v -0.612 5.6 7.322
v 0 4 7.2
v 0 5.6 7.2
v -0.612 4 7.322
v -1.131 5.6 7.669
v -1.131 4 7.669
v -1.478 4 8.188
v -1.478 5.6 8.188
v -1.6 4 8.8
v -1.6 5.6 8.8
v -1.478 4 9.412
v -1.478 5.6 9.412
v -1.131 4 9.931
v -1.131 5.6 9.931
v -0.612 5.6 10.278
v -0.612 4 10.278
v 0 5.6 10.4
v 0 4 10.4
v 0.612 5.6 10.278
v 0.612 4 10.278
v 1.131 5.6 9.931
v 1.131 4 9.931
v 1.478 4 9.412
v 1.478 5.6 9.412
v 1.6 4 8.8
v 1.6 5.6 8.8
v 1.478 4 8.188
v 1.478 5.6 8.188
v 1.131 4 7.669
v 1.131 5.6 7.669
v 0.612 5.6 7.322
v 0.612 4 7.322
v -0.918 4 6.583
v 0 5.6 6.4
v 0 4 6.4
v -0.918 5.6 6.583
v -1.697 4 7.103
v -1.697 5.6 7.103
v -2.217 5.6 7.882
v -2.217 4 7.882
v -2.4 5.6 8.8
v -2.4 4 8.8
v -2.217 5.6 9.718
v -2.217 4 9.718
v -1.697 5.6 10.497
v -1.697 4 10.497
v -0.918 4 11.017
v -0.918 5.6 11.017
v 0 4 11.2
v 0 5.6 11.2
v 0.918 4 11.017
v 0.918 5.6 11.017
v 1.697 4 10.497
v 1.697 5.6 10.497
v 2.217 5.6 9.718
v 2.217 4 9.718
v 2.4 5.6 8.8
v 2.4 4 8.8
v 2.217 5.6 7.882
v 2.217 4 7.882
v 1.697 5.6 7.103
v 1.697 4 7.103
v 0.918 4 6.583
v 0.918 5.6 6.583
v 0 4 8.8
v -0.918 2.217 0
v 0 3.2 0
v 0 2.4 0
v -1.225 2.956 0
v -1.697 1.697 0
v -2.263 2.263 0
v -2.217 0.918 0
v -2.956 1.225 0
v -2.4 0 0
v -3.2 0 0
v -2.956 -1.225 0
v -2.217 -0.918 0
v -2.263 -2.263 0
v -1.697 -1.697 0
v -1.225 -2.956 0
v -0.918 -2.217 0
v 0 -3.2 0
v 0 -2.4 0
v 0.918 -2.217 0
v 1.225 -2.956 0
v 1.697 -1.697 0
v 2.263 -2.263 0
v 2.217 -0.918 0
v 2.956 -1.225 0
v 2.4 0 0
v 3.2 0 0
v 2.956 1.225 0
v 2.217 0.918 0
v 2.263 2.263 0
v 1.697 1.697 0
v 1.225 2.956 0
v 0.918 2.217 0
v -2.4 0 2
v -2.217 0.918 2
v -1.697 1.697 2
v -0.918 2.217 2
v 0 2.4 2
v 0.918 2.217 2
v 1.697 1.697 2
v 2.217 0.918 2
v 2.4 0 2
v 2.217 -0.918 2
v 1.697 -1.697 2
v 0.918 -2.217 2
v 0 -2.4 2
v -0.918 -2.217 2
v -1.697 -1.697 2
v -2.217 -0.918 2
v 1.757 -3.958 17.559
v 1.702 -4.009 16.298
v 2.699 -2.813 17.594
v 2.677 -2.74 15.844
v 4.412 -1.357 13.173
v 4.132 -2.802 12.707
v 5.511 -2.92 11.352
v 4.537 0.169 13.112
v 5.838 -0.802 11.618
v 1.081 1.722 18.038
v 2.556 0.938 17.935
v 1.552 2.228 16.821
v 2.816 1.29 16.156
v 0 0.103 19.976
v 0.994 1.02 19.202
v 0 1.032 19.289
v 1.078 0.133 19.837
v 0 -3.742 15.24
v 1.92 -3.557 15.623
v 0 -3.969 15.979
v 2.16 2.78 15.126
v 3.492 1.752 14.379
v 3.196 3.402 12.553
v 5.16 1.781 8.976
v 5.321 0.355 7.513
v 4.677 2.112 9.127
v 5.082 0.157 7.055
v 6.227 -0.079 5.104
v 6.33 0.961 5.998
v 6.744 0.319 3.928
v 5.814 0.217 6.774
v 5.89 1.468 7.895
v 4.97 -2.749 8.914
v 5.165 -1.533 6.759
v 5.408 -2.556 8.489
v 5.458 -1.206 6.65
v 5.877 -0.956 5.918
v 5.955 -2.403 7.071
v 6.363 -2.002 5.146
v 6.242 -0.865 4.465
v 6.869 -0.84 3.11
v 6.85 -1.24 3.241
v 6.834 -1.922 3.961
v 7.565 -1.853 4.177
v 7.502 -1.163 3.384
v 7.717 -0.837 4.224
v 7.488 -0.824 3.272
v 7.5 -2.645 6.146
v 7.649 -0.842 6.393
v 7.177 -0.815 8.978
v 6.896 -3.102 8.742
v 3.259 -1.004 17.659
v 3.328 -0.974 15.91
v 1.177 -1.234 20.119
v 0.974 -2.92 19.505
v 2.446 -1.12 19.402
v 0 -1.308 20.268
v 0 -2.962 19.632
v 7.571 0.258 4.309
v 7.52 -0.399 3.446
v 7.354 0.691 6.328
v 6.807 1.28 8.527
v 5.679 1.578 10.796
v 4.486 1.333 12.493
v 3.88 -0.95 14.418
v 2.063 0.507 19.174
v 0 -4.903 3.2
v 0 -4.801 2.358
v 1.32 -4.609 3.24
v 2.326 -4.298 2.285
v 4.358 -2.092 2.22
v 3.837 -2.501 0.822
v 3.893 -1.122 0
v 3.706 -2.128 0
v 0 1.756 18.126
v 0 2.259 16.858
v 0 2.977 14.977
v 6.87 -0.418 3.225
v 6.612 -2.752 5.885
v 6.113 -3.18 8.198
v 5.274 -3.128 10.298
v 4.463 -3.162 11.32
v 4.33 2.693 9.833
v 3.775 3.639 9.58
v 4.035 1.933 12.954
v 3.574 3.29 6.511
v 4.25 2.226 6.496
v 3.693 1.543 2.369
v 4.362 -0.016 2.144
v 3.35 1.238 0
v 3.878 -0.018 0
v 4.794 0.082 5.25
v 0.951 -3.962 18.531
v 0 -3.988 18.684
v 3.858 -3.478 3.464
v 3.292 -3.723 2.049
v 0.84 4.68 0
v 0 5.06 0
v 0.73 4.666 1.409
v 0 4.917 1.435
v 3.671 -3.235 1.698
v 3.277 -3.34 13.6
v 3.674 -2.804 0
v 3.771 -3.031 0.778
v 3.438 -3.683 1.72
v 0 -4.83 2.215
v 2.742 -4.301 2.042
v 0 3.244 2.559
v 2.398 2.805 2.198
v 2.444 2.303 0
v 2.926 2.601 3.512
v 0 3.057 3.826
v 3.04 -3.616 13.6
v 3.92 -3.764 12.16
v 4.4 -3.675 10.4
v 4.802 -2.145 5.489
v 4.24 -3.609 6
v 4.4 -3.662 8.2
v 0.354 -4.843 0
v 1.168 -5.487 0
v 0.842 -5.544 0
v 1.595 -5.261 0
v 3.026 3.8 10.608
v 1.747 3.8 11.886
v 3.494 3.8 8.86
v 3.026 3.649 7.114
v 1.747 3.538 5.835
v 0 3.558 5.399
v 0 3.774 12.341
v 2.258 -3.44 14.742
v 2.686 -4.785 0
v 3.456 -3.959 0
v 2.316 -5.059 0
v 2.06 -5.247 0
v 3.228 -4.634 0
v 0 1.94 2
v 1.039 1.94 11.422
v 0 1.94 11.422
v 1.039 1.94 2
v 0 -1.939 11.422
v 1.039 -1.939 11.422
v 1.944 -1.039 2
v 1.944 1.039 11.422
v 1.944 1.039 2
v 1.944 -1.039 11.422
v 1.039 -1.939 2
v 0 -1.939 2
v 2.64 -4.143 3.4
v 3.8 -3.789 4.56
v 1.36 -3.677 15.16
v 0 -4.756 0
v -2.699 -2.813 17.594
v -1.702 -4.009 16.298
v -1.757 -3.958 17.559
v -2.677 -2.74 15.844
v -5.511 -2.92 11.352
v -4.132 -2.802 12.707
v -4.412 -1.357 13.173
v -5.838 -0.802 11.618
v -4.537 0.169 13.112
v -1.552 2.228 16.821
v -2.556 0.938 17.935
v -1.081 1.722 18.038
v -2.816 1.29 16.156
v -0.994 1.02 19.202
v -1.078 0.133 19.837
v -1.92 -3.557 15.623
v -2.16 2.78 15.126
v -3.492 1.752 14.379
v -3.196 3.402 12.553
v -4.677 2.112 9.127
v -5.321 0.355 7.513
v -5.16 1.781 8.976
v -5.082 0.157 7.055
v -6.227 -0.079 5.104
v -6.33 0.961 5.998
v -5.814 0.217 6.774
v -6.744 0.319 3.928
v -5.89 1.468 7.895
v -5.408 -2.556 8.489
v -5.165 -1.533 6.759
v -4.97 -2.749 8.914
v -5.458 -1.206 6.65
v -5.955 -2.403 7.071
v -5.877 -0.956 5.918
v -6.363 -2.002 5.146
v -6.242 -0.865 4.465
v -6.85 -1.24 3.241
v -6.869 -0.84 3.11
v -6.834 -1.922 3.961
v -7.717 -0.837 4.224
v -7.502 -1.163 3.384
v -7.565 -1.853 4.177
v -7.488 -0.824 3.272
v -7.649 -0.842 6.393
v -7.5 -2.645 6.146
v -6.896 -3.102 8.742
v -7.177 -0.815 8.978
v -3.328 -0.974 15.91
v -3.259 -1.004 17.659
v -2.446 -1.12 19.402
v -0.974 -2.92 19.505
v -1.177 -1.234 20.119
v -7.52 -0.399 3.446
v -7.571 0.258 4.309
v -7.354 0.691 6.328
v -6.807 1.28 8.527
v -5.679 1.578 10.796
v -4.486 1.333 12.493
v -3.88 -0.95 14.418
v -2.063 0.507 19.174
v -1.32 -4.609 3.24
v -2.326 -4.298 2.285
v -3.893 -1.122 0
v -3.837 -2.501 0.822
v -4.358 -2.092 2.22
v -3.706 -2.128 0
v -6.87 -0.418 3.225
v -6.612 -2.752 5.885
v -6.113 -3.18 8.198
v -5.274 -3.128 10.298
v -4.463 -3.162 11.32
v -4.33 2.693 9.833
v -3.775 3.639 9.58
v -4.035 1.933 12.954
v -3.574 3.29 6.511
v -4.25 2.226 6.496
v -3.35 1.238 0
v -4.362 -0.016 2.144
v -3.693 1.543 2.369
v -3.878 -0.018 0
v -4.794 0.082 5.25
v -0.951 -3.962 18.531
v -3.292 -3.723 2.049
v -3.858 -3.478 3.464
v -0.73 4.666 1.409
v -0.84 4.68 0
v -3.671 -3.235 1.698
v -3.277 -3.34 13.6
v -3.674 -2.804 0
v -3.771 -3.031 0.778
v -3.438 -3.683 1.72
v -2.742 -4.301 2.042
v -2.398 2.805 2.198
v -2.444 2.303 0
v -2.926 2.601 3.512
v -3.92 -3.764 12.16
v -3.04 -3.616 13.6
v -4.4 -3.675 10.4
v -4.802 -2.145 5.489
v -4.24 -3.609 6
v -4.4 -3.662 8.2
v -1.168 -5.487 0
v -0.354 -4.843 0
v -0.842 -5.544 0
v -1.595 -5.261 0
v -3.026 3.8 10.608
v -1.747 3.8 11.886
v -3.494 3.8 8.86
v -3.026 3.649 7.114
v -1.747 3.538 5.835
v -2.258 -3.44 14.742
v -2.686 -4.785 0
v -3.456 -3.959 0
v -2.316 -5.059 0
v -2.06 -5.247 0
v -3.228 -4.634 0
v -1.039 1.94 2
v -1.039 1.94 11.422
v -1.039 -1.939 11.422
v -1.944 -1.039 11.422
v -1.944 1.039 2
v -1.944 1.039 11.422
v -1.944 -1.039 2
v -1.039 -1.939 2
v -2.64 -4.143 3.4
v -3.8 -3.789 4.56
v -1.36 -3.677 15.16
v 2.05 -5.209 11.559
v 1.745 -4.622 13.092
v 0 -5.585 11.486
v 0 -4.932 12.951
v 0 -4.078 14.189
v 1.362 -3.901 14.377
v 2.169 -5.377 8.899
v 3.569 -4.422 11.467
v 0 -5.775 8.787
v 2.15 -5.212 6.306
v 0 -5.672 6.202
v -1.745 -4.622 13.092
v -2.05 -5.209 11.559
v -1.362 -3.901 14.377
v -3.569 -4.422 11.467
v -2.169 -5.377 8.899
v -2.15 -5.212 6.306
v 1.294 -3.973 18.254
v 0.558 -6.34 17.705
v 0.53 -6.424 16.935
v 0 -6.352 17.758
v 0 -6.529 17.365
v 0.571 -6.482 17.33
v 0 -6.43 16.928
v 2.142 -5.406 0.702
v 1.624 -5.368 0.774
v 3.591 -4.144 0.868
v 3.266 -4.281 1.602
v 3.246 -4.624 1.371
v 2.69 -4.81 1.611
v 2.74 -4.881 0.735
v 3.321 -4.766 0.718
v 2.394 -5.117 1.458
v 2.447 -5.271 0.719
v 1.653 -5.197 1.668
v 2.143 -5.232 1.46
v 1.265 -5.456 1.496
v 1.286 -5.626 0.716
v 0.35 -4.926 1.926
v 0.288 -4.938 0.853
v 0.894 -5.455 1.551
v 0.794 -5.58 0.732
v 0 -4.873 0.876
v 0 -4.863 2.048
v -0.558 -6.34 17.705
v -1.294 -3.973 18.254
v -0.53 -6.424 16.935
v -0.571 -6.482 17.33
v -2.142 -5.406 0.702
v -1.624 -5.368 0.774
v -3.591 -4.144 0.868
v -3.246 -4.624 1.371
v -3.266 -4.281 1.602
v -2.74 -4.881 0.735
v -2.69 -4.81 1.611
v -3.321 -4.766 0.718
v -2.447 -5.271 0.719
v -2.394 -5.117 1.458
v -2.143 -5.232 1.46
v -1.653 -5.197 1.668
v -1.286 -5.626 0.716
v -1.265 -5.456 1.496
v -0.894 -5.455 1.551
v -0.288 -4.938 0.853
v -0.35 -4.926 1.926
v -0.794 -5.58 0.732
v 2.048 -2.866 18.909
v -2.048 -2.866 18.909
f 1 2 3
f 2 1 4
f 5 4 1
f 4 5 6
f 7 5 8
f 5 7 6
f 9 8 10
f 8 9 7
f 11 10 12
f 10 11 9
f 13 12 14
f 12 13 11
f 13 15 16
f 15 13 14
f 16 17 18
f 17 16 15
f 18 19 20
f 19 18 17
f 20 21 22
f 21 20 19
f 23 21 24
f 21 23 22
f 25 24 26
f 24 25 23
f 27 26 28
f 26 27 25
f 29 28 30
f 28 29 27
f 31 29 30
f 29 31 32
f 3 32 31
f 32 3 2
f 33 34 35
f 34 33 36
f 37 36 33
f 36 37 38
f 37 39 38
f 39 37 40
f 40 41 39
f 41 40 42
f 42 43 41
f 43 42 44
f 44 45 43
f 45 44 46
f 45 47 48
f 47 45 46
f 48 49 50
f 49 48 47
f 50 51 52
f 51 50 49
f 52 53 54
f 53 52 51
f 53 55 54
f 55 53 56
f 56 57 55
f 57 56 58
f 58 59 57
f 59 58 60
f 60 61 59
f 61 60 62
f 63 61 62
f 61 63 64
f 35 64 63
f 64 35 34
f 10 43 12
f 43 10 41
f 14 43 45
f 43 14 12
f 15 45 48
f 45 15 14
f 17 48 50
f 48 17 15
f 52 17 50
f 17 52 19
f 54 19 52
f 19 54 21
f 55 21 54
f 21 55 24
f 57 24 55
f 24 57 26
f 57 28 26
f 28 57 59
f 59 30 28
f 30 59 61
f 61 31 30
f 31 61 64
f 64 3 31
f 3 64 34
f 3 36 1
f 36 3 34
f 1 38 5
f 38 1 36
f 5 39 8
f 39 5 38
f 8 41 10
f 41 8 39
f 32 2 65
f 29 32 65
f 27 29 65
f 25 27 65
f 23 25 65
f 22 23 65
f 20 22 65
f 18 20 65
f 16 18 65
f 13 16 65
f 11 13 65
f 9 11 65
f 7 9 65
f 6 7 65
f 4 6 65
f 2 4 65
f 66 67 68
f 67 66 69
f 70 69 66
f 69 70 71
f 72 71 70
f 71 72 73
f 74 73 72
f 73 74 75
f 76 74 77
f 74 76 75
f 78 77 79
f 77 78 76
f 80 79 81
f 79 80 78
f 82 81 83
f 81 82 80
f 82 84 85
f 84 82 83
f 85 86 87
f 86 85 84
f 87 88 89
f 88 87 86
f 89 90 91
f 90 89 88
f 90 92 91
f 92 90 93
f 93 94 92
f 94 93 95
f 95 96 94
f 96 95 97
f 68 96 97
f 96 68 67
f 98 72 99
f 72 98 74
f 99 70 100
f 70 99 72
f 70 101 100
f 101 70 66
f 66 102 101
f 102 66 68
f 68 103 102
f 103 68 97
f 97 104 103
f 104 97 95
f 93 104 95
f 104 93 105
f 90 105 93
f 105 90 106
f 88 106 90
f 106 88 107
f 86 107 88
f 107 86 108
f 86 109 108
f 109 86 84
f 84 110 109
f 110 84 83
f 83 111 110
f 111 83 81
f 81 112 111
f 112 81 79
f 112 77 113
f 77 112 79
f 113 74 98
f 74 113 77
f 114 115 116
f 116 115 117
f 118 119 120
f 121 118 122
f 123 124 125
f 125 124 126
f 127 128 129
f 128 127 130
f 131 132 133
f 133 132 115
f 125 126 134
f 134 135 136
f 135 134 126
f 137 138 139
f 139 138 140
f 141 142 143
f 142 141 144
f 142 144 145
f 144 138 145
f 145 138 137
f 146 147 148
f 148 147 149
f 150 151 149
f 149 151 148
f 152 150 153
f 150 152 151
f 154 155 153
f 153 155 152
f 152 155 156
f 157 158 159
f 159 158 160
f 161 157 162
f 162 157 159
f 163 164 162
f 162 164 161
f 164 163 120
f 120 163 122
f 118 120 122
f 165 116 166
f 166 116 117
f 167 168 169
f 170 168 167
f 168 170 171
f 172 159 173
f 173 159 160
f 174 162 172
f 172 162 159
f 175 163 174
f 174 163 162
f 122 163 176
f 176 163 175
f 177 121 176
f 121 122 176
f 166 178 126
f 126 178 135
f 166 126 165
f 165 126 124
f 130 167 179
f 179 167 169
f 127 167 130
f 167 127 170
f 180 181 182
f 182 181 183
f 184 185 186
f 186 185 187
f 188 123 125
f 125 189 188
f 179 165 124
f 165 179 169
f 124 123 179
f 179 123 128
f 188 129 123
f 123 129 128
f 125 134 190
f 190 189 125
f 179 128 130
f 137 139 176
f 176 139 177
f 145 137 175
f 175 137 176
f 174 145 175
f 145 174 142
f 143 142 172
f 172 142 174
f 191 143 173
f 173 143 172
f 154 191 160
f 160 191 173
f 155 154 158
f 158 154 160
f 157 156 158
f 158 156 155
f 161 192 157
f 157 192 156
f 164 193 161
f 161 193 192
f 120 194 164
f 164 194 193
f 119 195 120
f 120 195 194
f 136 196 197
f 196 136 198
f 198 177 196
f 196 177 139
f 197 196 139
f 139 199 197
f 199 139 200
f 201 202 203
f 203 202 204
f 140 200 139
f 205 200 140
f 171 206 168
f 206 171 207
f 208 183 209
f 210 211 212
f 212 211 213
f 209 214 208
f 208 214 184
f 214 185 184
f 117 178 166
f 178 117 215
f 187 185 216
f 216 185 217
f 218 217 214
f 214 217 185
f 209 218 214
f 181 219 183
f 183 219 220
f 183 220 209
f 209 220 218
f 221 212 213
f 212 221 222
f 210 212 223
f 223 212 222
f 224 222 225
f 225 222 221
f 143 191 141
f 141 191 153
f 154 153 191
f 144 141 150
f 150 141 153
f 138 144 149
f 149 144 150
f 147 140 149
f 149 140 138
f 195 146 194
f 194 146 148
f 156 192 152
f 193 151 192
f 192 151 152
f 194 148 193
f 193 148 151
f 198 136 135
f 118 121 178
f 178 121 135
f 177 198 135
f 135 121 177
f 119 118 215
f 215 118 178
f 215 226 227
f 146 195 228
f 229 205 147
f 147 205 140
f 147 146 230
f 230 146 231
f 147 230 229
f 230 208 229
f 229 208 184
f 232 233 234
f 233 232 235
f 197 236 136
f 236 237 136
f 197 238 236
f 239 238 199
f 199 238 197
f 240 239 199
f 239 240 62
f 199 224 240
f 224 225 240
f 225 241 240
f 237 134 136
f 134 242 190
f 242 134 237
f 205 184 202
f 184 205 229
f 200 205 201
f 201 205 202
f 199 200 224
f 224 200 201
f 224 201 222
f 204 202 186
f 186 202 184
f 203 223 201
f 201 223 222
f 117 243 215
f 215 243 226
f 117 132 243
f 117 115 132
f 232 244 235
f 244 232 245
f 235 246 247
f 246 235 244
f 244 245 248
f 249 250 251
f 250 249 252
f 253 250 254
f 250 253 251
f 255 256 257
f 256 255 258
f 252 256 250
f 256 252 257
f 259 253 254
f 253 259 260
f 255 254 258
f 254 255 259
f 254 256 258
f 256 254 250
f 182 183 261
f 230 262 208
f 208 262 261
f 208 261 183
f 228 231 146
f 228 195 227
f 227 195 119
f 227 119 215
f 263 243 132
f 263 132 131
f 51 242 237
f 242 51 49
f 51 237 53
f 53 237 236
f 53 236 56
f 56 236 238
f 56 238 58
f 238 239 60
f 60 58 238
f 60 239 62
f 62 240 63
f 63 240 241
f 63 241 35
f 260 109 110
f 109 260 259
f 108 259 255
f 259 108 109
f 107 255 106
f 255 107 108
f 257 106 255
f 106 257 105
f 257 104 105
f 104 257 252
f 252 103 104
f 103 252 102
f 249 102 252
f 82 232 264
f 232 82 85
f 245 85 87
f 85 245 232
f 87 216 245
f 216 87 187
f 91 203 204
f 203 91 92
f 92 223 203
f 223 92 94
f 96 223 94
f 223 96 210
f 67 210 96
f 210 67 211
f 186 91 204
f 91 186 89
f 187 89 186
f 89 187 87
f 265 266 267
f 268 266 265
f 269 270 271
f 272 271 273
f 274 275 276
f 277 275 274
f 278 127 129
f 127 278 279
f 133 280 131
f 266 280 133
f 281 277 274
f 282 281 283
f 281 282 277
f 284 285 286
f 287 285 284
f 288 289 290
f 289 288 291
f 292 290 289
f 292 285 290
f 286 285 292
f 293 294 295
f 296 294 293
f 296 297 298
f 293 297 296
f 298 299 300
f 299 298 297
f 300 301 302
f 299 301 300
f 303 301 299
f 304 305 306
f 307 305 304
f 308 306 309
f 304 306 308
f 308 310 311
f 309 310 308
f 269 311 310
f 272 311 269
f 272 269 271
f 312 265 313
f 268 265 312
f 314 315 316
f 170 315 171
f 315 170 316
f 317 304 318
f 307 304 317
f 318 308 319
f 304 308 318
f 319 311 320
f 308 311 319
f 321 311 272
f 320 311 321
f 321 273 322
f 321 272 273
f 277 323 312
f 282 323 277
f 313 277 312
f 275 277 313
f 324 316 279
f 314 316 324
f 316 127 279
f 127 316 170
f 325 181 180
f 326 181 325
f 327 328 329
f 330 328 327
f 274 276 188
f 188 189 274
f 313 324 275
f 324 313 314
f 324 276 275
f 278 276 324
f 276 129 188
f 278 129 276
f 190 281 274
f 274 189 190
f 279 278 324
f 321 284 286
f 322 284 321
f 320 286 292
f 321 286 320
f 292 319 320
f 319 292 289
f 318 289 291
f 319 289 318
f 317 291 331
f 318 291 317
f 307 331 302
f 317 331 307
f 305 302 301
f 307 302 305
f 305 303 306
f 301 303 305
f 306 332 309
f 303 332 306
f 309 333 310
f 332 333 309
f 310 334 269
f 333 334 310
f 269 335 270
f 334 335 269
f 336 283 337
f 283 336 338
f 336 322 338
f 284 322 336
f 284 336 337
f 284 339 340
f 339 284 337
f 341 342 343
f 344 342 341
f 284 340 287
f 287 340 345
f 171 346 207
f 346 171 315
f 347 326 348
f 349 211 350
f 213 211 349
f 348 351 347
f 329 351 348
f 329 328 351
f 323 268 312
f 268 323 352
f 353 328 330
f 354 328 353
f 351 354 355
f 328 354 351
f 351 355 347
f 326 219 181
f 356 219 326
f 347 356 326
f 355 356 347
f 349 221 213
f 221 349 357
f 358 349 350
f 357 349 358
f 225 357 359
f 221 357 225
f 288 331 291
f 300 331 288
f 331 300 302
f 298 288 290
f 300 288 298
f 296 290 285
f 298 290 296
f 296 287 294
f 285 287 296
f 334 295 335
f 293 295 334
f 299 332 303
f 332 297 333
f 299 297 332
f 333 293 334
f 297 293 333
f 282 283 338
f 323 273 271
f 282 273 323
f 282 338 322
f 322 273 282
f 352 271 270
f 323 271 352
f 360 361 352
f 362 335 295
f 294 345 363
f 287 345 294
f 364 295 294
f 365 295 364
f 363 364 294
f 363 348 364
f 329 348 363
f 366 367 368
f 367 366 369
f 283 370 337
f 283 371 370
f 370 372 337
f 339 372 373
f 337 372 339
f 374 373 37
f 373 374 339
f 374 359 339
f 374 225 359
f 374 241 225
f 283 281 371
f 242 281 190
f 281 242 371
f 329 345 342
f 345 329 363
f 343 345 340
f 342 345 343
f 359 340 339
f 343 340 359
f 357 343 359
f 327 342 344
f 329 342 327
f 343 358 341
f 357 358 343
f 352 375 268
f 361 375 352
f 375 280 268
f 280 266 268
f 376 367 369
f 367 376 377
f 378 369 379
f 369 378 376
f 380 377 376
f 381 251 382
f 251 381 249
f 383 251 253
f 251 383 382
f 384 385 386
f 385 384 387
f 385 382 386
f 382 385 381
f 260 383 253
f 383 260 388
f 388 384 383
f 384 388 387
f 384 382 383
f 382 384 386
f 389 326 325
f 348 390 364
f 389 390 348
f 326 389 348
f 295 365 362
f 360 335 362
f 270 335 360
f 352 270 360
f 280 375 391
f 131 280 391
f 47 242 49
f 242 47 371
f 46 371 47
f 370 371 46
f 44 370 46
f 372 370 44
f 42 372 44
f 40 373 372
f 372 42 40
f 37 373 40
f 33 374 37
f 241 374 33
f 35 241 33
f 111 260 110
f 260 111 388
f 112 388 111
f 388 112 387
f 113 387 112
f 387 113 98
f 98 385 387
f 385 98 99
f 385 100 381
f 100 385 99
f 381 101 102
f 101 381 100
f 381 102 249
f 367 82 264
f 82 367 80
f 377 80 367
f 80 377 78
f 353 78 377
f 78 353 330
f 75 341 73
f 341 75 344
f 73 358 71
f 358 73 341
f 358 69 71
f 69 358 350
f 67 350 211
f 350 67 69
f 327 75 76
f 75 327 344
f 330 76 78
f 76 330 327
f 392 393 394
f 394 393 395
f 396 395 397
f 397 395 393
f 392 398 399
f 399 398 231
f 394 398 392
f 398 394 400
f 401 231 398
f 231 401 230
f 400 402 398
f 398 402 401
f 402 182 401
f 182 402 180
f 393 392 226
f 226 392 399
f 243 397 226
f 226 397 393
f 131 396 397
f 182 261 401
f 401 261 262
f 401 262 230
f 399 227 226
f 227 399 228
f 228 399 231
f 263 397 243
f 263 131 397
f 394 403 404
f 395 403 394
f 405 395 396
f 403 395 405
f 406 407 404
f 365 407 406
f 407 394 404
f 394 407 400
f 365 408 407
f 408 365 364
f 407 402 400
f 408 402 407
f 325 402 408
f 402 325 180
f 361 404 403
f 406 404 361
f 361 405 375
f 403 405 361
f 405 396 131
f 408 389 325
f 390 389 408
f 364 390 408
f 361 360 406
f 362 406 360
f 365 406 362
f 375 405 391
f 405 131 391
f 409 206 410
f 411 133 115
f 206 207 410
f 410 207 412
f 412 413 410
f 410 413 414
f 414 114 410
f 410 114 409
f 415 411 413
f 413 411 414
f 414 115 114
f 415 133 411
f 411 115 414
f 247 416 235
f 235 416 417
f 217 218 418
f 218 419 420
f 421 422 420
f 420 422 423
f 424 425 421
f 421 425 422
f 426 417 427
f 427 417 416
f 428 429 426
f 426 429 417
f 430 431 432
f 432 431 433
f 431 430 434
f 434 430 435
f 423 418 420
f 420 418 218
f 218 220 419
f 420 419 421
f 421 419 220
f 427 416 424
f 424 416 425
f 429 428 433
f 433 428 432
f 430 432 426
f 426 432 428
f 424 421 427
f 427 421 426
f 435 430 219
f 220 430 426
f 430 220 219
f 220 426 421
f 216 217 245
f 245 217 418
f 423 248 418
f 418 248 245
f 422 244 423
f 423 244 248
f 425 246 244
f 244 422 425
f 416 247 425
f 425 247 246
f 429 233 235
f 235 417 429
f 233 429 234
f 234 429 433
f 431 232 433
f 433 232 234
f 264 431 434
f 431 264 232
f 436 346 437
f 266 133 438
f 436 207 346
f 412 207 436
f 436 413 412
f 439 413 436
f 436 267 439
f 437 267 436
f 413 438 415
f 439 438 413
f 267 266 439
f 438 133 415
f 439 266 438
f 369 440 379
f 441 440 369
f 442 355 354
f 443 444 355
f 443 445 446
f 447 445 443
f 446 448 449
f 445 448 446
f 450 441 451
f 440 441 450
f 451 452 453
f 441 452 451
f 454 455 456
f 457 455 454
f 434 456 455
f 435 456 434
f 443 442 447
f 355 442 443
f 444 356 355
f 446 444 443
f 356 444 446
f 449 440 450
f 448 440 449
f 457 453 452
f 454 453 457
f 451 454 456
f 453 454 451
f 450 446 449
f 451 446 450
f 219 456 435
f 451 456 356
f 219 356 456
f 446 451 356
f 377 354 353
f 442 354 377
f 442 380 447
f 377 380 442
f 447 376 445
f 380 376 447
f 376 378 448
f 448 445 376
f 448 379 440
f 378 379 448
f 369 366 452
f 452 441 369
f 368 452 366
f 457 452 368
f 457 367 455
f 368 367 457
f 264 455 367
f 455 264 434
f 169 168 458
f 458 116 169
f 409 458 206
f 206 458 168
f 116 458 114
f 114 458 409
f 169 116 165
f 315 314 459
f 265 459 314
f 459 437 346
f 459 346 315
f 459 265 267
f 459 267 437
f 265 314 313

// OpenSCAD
use <../lib.scad>
use <../p/4-4disc.scad>
use <s/26074s01.scad>
use <s/26074s02.scad>
use <s/26074s03.scad>
use <s/26074s04.scad>
use <../p/stud2.scad>
use <../p/stud4od.scad>
function ldraw_lib__26074() = [
// 0 Animal Penguin
// 0 Name: 26074.dat
// 0 Author: Philippe Hurbain [Philo]
// 0 !LDRAW_ORG Part UPDATE 2018-02
// 0 !LICENSE Licensed under CC BY 4.0 : see CAreadme.txt
// 
// 0 BFC CERTIFY CCW
  [0,"BFC","CERTIFY"],
  [0,"BFC","CCW"],
// 
// 0 !HISTORY 2018-01-09 {LEGO Digital Designer} Original part shape
// 0 !HISTORY 2018-01-30 [Philo] File preparation for LDraw Parts Tracker
// 0 !HISTORY 2018-12-08 [PTadmin] Official Update 2018-02
// 
// 
// 1 16 0 -22 10 0 0 -1 1 0 0 0 -1 0 stud2.dat
  [1,16,0,-22,10,0,0,-1,1,0,0,0,-1,0, ldraw_lib__stud2()],
// 1 16 0 -22 10 0 0 4 4 0 0 0 -1 0 4-4disc.dat
  [1,16,0,-22,10,0,0,4,4,0,0,0,-1,0, ldraw_lib__4_4disc()],
// 1 16 0 -5 0 1 0 0 0 -1.25 0 0 0 1 stud4od.dat
  [1,16,0,-5,0,1,0,0,0,-1.25,0,0,0,1, ldraw_lib__stud4od()],
// 
// 1 16 0 0 0 1 0 0 0 1 0 0 0 1 s\26074s01.dat
  [1,16,0,0,0,1,0,0,0,1,0,0,0,1, ldraw_lib__s__26074s01()],
// 1 16 0 0 0 -1 0 0 0 1 0 0 0 1 s\26074s01.dat
  [1,16,0,0,0,-1,0,0,0,1,0,0,0,1, ldraw_lib__s__26074s01()],
// 1 16 0 0 0 1 0 0 0 1 0 0 0 1 s\26074s02.dat
  [1,16,0,0,0,1,0,0,0,1,0,0,0,1, ldraw_lib__s__26074s02()],
// 1 16 0 0 0 -1 0 0 0 1 0 0 0 1 s\26074s02.dat
  [1,16,0,0,0,-1,0,0,0,1,0,0,0,1, ldraw_lib__s__26074s02()],
// 1 16 0 0 0 1 0 0 0 1 0 0 0 1 s\26074s03.dat
  [1,16,0,0,0,1,0,0,0,1,0,0,0,1, ldraw_lib__s__26074s03()],
// 1 16 0 0 0 1 0 0 0 1 0 0 0 1 s\26074s04.dat
  [1,16,0,0,0,1,0,0,0,1,0,0,0,1, ldraw_lib__s__26074s04()],
// 1 16 0 0 0 -1 0 0 0 1 0 0 0 1 s\26074s03.dat
  [1,16,0,0,0,-1,0,0,0,1,0,0,0,1, ldraw_lib__s__26074s03()],
// 1 16 0 0 0 -1 0 0 0 1 0 0 0 1 s\26074s04.dat
  [1,16,0,0,0,-1,0,0,0,1,0,0,0,1, ldraw_lib__s__26074s04()],
// 0 // eyes
// 3 16 6.114 -48.504 -2.8 2.434 -48.762 -7.301 5.121 -47.272 -7.165
  [3,16,6.114,-48.504,-2.8,2.434,-48.762,-7.301,5.121,-47.272,-7.165],
// 3 16 5.121 -47.272 -7.165 6.747 -43.984 -7.032 6.114 -48.504 -2.8
  [3,16,5.121,-47.272,-7.165,6.747,-43.984,-7.032,6.114,-48.504,-2.8],
// 3 16 3.236 -45.634 -9.932 5.121 -47.272 -7.165 2.377 -46.327 -9.906
  [3,16,3.236,-45.634,-9.932,5.121,-47.272,-7.165,2.377,-46.327,-9.906],
// 3 16 2.377 -46.327 -9.906 5.121 -47.272 -7.165 2.434 -48.762 -7.301
  [3,16,2.377,-46.327,-9.906,5.121,-47.272,-7.165,2.434,-48.762,-7.301],
// 3 16 6.747 -43.984 -7.032 5.121 -47.272 -7.165 4.392 -43.897 -9.894
  [3,16,6.747,-43.984,-7.032,5.121,-47.272,-7.165,4.392,-43.897,-9.894],
// 3 16 4.392 -43.897 -9.894 5.121 -47.272 -7.165 3.236 -45.634 -9.932
  [3,16,4.392,-43.897,-9.894,5.121,-47.272,-7.165,3.236,-45.634,-9.932],
// 3 16 6.114 -48.504 -2.8 6.747 -43.984 -7.032 8.148 -44.148 -2.51
  [3,16,6.114,-48.504,-2.8,6.747,-43.984,-7.032,8.148,-44.148,-2.51],
// 5 24 5.121 -47.272 -7.165 6.747 -43.984 -7.032 4.392 -43.897 -9.894 6.114 -48.504 -2.8
  [5,24,5.121,-47.272,-7.165,6.747,-43.984,-7.032,4.392,-43.897,-9.894,6.114,-48.504,-2.8],
// 5 24 5.121 -47.272 -7.165 4.392 -43.897 -9.894 3.236 -45.634 -9.932 6.747 -43.984 -7.032
  [5,24,5.121,-47.272,-7.165,4.392,-43.897,-9.894,3.236,-45.634,-9.932,6.747,-43.984,-7.032],
// 5 24 5.121 -47.272 -7.165 6.114 -48.504 -2.8 2.434 -48.762 -7.301 6.747 -43.984 -7.032
  [5,24,5.121,-47.272,-7.165,6.114,-48.504,-2.8,2.434,-48.762,-7.301,6.747,-43.984,-7.032],
// 5 24 6.747 -43.984 -7.032 6.114 -48.504 -2.8 5.121 -47.272 -7.165 8.148 -44.148 -2.51
  [5,24,6.747,-43.984,-7.032,6.114,-48.504,-2.8,5.121,-47.272,-7.165,8.148,-44.148,-2.51],
// 5 24 3.236 -45.634 -9.932 5.121 -47.272 -7.165 4.392 -43.897 -9.894 2.377 -46.327 -9.906
  [5,24,3.236,-45.634,-9.932,5.121,-47.272,-7.165,4.392,-43.897,-9.894,2.377,-46.327,-9.906],
// 5 24 2.434 -48.762 -7.301 5.121 -47.272 -7.165 6.114 -48.504 -2.8 2.377 -46.327 -9.906
  [5,24,2.434,-48.762,-7.301,5.121,-47.272,-7.165,6.114,-48.504,-2.8,2.377,-46.327,-9.906],
// 5 24 5.121 -47.272 -7.165 2.377 -46.327 -9.906 2.434 -48.762 -7.301 3.236 -45.634 -9.932
  [5,24,5.121,-47.272,-7.165,2.377,-46.327,-9.906,2.434,-48.762,-7.301,3.236,-45.634,-9.932],
// 3 16 -2.434 -48.762 -7.301 -6.114 -48.504 -2.8 -5.121 -47.272 -7.165
  [3,16,-2.434,-48.762,-7.301,-6.114,-48.504,-2.8,-5.121,-47.272,-7.165],
// 3 16 -6.747 -43.984 -7.032 -5.121 -47.272 -7.165 -6.114 -48.504 -2.8
  [3,16,-6.747,-43.984,-7.032,-5.121,-47.272,-7.165,-6.114,-48.504,-2.8],
// 3 16 -5.121 -47.272 -7.165 -3.236 -45.634 -9.932 -2.377 -46.327 -9.906
  [3,16,-5.121,-47.272,-7.165,-3.236,-45.634,-9.932,-2.377,-46.327,-9.906],
// 3 16 -5.121 -47.272 -7.165 -2.377 -46.327 -9.906 -2.434 -48.762 -7.301
  [3,16,-5.121,-47.272,-7.165,-2.377,-46.327,-9.906,-2.434,-48.762,-7.301],
// 3 16 -5.121 -47.272 -7.165 -6.747 -43.984 -7.032 -4.392 -43.897 -9.894
  [3,16,-5.121,-47.272,-7.165,-6.747,-43.984,-7.032,-4.392,-43.897,-9.894],
// 3 16 -5.121 -47.272 -7.165 -4.392 -43.897 -9.894 -3.236 -45.634 -9.932
  [3,16,-5.121,-47.272,-7.165,-4.392,-43.897,-9.894,-3.236,-45.634,-9.932],
// 3 16 -6.747 -43.984 -7.032 -6.114 -48.504 -2.8 -8.148 -44.148 -2.51
  [3,16,-6.747,-43.984,-7.032,-6.114,-48.504,-2.8,-8.148,-44.148,-2.51],
// 5 24 -5.121 -47.272 -7.165 -6.747 -43.984 -7.032 -4.392 -43.897 -9.894 -6.114 -48.504 -2.8
  [5,24,-5.121,-47.272,-7.165,-6.747,-43.984,-7.032,-4.392,-43.897,-9.894,-6.114,-48.504,-2.8],
// 5 24 -5.121 -47.272 -7.165 -4.392 -43.897 -9.894 -3.236 -45.634 -9.932 -6.747 -43.984 -7.032
  [5,24,-5.121,-47.272,-7.165,-4.392,-43.897,-9.894,-3.236,-45.634,-9.932,-6.747,-43.984,-7.032],
// 5 24 -5.121 -47.272 -7.165 -6.114 -48.504 -2.8 -2.434 -48.762 -7.301 -6.747 -43.984 -7.032
  [5,24,-5.121,-47.272,-7.165,-6.114,-48.504,-2.8,-2.434,-48.762,-7.301,-6.747,-43.984,-7.032],
// 5 24 -6.747 -43.984 -7.032 -6.114 -48.504 -2.8 -5.121 -47.272 -7.165 -8.148 -44.148 -2.51
  [5,24,-6.747,-43.984,-7.032,-6.114,-48.504,-2.8,-5.121,-47.272,-7.165,-8.148,-44.148,-2.51],
// 5 24 -3.236 -45.634 -9.932 -5.121 -47.272 -7.165 -4.392 -43.897 -9.894 -2.377 -46.327 -9.906
  [5,24,-3.236,-45.634,-9.932,-5.121,-47.272,-7.165,-4.392,-43.897,-9.894,-2.377,-46.327,-9.906],
// 5 24 -2.434 -48.762 -7.301 -5.121 -47.272 -7.165 -6.114 -48.504 -2.8 -2.377 -46.327 -9.906
  [5,24,-2.434,-48.762,-7.301,-5.121,-47.272,-7.165,-6.114,-48.504,-2.8,-2.377,-46.327,-9.906],
// 5 24 -5.121 -47.272 -7.165 -2.377 -46.327 -9.906 -2.434 -48.762 -7.301 -3.236 -45.634 -9.932
  [5,24,-5.121,-47.272,-7.165,-2.377,-46.327,-9.906,-2.434,-48.762,-7.301,-3.236,-45.634,-9.932],
];
module ldraw_lib__26074(step=0, col=false, unit=2/5, alt=false, line=0.2, solid=!$preview)
    makepoly(ldraw_lib__26074(), step=step, col=col, unit=unit, alt=alt, line=line, solid=solid);
ldraw_lib__26074(line=0.2);
